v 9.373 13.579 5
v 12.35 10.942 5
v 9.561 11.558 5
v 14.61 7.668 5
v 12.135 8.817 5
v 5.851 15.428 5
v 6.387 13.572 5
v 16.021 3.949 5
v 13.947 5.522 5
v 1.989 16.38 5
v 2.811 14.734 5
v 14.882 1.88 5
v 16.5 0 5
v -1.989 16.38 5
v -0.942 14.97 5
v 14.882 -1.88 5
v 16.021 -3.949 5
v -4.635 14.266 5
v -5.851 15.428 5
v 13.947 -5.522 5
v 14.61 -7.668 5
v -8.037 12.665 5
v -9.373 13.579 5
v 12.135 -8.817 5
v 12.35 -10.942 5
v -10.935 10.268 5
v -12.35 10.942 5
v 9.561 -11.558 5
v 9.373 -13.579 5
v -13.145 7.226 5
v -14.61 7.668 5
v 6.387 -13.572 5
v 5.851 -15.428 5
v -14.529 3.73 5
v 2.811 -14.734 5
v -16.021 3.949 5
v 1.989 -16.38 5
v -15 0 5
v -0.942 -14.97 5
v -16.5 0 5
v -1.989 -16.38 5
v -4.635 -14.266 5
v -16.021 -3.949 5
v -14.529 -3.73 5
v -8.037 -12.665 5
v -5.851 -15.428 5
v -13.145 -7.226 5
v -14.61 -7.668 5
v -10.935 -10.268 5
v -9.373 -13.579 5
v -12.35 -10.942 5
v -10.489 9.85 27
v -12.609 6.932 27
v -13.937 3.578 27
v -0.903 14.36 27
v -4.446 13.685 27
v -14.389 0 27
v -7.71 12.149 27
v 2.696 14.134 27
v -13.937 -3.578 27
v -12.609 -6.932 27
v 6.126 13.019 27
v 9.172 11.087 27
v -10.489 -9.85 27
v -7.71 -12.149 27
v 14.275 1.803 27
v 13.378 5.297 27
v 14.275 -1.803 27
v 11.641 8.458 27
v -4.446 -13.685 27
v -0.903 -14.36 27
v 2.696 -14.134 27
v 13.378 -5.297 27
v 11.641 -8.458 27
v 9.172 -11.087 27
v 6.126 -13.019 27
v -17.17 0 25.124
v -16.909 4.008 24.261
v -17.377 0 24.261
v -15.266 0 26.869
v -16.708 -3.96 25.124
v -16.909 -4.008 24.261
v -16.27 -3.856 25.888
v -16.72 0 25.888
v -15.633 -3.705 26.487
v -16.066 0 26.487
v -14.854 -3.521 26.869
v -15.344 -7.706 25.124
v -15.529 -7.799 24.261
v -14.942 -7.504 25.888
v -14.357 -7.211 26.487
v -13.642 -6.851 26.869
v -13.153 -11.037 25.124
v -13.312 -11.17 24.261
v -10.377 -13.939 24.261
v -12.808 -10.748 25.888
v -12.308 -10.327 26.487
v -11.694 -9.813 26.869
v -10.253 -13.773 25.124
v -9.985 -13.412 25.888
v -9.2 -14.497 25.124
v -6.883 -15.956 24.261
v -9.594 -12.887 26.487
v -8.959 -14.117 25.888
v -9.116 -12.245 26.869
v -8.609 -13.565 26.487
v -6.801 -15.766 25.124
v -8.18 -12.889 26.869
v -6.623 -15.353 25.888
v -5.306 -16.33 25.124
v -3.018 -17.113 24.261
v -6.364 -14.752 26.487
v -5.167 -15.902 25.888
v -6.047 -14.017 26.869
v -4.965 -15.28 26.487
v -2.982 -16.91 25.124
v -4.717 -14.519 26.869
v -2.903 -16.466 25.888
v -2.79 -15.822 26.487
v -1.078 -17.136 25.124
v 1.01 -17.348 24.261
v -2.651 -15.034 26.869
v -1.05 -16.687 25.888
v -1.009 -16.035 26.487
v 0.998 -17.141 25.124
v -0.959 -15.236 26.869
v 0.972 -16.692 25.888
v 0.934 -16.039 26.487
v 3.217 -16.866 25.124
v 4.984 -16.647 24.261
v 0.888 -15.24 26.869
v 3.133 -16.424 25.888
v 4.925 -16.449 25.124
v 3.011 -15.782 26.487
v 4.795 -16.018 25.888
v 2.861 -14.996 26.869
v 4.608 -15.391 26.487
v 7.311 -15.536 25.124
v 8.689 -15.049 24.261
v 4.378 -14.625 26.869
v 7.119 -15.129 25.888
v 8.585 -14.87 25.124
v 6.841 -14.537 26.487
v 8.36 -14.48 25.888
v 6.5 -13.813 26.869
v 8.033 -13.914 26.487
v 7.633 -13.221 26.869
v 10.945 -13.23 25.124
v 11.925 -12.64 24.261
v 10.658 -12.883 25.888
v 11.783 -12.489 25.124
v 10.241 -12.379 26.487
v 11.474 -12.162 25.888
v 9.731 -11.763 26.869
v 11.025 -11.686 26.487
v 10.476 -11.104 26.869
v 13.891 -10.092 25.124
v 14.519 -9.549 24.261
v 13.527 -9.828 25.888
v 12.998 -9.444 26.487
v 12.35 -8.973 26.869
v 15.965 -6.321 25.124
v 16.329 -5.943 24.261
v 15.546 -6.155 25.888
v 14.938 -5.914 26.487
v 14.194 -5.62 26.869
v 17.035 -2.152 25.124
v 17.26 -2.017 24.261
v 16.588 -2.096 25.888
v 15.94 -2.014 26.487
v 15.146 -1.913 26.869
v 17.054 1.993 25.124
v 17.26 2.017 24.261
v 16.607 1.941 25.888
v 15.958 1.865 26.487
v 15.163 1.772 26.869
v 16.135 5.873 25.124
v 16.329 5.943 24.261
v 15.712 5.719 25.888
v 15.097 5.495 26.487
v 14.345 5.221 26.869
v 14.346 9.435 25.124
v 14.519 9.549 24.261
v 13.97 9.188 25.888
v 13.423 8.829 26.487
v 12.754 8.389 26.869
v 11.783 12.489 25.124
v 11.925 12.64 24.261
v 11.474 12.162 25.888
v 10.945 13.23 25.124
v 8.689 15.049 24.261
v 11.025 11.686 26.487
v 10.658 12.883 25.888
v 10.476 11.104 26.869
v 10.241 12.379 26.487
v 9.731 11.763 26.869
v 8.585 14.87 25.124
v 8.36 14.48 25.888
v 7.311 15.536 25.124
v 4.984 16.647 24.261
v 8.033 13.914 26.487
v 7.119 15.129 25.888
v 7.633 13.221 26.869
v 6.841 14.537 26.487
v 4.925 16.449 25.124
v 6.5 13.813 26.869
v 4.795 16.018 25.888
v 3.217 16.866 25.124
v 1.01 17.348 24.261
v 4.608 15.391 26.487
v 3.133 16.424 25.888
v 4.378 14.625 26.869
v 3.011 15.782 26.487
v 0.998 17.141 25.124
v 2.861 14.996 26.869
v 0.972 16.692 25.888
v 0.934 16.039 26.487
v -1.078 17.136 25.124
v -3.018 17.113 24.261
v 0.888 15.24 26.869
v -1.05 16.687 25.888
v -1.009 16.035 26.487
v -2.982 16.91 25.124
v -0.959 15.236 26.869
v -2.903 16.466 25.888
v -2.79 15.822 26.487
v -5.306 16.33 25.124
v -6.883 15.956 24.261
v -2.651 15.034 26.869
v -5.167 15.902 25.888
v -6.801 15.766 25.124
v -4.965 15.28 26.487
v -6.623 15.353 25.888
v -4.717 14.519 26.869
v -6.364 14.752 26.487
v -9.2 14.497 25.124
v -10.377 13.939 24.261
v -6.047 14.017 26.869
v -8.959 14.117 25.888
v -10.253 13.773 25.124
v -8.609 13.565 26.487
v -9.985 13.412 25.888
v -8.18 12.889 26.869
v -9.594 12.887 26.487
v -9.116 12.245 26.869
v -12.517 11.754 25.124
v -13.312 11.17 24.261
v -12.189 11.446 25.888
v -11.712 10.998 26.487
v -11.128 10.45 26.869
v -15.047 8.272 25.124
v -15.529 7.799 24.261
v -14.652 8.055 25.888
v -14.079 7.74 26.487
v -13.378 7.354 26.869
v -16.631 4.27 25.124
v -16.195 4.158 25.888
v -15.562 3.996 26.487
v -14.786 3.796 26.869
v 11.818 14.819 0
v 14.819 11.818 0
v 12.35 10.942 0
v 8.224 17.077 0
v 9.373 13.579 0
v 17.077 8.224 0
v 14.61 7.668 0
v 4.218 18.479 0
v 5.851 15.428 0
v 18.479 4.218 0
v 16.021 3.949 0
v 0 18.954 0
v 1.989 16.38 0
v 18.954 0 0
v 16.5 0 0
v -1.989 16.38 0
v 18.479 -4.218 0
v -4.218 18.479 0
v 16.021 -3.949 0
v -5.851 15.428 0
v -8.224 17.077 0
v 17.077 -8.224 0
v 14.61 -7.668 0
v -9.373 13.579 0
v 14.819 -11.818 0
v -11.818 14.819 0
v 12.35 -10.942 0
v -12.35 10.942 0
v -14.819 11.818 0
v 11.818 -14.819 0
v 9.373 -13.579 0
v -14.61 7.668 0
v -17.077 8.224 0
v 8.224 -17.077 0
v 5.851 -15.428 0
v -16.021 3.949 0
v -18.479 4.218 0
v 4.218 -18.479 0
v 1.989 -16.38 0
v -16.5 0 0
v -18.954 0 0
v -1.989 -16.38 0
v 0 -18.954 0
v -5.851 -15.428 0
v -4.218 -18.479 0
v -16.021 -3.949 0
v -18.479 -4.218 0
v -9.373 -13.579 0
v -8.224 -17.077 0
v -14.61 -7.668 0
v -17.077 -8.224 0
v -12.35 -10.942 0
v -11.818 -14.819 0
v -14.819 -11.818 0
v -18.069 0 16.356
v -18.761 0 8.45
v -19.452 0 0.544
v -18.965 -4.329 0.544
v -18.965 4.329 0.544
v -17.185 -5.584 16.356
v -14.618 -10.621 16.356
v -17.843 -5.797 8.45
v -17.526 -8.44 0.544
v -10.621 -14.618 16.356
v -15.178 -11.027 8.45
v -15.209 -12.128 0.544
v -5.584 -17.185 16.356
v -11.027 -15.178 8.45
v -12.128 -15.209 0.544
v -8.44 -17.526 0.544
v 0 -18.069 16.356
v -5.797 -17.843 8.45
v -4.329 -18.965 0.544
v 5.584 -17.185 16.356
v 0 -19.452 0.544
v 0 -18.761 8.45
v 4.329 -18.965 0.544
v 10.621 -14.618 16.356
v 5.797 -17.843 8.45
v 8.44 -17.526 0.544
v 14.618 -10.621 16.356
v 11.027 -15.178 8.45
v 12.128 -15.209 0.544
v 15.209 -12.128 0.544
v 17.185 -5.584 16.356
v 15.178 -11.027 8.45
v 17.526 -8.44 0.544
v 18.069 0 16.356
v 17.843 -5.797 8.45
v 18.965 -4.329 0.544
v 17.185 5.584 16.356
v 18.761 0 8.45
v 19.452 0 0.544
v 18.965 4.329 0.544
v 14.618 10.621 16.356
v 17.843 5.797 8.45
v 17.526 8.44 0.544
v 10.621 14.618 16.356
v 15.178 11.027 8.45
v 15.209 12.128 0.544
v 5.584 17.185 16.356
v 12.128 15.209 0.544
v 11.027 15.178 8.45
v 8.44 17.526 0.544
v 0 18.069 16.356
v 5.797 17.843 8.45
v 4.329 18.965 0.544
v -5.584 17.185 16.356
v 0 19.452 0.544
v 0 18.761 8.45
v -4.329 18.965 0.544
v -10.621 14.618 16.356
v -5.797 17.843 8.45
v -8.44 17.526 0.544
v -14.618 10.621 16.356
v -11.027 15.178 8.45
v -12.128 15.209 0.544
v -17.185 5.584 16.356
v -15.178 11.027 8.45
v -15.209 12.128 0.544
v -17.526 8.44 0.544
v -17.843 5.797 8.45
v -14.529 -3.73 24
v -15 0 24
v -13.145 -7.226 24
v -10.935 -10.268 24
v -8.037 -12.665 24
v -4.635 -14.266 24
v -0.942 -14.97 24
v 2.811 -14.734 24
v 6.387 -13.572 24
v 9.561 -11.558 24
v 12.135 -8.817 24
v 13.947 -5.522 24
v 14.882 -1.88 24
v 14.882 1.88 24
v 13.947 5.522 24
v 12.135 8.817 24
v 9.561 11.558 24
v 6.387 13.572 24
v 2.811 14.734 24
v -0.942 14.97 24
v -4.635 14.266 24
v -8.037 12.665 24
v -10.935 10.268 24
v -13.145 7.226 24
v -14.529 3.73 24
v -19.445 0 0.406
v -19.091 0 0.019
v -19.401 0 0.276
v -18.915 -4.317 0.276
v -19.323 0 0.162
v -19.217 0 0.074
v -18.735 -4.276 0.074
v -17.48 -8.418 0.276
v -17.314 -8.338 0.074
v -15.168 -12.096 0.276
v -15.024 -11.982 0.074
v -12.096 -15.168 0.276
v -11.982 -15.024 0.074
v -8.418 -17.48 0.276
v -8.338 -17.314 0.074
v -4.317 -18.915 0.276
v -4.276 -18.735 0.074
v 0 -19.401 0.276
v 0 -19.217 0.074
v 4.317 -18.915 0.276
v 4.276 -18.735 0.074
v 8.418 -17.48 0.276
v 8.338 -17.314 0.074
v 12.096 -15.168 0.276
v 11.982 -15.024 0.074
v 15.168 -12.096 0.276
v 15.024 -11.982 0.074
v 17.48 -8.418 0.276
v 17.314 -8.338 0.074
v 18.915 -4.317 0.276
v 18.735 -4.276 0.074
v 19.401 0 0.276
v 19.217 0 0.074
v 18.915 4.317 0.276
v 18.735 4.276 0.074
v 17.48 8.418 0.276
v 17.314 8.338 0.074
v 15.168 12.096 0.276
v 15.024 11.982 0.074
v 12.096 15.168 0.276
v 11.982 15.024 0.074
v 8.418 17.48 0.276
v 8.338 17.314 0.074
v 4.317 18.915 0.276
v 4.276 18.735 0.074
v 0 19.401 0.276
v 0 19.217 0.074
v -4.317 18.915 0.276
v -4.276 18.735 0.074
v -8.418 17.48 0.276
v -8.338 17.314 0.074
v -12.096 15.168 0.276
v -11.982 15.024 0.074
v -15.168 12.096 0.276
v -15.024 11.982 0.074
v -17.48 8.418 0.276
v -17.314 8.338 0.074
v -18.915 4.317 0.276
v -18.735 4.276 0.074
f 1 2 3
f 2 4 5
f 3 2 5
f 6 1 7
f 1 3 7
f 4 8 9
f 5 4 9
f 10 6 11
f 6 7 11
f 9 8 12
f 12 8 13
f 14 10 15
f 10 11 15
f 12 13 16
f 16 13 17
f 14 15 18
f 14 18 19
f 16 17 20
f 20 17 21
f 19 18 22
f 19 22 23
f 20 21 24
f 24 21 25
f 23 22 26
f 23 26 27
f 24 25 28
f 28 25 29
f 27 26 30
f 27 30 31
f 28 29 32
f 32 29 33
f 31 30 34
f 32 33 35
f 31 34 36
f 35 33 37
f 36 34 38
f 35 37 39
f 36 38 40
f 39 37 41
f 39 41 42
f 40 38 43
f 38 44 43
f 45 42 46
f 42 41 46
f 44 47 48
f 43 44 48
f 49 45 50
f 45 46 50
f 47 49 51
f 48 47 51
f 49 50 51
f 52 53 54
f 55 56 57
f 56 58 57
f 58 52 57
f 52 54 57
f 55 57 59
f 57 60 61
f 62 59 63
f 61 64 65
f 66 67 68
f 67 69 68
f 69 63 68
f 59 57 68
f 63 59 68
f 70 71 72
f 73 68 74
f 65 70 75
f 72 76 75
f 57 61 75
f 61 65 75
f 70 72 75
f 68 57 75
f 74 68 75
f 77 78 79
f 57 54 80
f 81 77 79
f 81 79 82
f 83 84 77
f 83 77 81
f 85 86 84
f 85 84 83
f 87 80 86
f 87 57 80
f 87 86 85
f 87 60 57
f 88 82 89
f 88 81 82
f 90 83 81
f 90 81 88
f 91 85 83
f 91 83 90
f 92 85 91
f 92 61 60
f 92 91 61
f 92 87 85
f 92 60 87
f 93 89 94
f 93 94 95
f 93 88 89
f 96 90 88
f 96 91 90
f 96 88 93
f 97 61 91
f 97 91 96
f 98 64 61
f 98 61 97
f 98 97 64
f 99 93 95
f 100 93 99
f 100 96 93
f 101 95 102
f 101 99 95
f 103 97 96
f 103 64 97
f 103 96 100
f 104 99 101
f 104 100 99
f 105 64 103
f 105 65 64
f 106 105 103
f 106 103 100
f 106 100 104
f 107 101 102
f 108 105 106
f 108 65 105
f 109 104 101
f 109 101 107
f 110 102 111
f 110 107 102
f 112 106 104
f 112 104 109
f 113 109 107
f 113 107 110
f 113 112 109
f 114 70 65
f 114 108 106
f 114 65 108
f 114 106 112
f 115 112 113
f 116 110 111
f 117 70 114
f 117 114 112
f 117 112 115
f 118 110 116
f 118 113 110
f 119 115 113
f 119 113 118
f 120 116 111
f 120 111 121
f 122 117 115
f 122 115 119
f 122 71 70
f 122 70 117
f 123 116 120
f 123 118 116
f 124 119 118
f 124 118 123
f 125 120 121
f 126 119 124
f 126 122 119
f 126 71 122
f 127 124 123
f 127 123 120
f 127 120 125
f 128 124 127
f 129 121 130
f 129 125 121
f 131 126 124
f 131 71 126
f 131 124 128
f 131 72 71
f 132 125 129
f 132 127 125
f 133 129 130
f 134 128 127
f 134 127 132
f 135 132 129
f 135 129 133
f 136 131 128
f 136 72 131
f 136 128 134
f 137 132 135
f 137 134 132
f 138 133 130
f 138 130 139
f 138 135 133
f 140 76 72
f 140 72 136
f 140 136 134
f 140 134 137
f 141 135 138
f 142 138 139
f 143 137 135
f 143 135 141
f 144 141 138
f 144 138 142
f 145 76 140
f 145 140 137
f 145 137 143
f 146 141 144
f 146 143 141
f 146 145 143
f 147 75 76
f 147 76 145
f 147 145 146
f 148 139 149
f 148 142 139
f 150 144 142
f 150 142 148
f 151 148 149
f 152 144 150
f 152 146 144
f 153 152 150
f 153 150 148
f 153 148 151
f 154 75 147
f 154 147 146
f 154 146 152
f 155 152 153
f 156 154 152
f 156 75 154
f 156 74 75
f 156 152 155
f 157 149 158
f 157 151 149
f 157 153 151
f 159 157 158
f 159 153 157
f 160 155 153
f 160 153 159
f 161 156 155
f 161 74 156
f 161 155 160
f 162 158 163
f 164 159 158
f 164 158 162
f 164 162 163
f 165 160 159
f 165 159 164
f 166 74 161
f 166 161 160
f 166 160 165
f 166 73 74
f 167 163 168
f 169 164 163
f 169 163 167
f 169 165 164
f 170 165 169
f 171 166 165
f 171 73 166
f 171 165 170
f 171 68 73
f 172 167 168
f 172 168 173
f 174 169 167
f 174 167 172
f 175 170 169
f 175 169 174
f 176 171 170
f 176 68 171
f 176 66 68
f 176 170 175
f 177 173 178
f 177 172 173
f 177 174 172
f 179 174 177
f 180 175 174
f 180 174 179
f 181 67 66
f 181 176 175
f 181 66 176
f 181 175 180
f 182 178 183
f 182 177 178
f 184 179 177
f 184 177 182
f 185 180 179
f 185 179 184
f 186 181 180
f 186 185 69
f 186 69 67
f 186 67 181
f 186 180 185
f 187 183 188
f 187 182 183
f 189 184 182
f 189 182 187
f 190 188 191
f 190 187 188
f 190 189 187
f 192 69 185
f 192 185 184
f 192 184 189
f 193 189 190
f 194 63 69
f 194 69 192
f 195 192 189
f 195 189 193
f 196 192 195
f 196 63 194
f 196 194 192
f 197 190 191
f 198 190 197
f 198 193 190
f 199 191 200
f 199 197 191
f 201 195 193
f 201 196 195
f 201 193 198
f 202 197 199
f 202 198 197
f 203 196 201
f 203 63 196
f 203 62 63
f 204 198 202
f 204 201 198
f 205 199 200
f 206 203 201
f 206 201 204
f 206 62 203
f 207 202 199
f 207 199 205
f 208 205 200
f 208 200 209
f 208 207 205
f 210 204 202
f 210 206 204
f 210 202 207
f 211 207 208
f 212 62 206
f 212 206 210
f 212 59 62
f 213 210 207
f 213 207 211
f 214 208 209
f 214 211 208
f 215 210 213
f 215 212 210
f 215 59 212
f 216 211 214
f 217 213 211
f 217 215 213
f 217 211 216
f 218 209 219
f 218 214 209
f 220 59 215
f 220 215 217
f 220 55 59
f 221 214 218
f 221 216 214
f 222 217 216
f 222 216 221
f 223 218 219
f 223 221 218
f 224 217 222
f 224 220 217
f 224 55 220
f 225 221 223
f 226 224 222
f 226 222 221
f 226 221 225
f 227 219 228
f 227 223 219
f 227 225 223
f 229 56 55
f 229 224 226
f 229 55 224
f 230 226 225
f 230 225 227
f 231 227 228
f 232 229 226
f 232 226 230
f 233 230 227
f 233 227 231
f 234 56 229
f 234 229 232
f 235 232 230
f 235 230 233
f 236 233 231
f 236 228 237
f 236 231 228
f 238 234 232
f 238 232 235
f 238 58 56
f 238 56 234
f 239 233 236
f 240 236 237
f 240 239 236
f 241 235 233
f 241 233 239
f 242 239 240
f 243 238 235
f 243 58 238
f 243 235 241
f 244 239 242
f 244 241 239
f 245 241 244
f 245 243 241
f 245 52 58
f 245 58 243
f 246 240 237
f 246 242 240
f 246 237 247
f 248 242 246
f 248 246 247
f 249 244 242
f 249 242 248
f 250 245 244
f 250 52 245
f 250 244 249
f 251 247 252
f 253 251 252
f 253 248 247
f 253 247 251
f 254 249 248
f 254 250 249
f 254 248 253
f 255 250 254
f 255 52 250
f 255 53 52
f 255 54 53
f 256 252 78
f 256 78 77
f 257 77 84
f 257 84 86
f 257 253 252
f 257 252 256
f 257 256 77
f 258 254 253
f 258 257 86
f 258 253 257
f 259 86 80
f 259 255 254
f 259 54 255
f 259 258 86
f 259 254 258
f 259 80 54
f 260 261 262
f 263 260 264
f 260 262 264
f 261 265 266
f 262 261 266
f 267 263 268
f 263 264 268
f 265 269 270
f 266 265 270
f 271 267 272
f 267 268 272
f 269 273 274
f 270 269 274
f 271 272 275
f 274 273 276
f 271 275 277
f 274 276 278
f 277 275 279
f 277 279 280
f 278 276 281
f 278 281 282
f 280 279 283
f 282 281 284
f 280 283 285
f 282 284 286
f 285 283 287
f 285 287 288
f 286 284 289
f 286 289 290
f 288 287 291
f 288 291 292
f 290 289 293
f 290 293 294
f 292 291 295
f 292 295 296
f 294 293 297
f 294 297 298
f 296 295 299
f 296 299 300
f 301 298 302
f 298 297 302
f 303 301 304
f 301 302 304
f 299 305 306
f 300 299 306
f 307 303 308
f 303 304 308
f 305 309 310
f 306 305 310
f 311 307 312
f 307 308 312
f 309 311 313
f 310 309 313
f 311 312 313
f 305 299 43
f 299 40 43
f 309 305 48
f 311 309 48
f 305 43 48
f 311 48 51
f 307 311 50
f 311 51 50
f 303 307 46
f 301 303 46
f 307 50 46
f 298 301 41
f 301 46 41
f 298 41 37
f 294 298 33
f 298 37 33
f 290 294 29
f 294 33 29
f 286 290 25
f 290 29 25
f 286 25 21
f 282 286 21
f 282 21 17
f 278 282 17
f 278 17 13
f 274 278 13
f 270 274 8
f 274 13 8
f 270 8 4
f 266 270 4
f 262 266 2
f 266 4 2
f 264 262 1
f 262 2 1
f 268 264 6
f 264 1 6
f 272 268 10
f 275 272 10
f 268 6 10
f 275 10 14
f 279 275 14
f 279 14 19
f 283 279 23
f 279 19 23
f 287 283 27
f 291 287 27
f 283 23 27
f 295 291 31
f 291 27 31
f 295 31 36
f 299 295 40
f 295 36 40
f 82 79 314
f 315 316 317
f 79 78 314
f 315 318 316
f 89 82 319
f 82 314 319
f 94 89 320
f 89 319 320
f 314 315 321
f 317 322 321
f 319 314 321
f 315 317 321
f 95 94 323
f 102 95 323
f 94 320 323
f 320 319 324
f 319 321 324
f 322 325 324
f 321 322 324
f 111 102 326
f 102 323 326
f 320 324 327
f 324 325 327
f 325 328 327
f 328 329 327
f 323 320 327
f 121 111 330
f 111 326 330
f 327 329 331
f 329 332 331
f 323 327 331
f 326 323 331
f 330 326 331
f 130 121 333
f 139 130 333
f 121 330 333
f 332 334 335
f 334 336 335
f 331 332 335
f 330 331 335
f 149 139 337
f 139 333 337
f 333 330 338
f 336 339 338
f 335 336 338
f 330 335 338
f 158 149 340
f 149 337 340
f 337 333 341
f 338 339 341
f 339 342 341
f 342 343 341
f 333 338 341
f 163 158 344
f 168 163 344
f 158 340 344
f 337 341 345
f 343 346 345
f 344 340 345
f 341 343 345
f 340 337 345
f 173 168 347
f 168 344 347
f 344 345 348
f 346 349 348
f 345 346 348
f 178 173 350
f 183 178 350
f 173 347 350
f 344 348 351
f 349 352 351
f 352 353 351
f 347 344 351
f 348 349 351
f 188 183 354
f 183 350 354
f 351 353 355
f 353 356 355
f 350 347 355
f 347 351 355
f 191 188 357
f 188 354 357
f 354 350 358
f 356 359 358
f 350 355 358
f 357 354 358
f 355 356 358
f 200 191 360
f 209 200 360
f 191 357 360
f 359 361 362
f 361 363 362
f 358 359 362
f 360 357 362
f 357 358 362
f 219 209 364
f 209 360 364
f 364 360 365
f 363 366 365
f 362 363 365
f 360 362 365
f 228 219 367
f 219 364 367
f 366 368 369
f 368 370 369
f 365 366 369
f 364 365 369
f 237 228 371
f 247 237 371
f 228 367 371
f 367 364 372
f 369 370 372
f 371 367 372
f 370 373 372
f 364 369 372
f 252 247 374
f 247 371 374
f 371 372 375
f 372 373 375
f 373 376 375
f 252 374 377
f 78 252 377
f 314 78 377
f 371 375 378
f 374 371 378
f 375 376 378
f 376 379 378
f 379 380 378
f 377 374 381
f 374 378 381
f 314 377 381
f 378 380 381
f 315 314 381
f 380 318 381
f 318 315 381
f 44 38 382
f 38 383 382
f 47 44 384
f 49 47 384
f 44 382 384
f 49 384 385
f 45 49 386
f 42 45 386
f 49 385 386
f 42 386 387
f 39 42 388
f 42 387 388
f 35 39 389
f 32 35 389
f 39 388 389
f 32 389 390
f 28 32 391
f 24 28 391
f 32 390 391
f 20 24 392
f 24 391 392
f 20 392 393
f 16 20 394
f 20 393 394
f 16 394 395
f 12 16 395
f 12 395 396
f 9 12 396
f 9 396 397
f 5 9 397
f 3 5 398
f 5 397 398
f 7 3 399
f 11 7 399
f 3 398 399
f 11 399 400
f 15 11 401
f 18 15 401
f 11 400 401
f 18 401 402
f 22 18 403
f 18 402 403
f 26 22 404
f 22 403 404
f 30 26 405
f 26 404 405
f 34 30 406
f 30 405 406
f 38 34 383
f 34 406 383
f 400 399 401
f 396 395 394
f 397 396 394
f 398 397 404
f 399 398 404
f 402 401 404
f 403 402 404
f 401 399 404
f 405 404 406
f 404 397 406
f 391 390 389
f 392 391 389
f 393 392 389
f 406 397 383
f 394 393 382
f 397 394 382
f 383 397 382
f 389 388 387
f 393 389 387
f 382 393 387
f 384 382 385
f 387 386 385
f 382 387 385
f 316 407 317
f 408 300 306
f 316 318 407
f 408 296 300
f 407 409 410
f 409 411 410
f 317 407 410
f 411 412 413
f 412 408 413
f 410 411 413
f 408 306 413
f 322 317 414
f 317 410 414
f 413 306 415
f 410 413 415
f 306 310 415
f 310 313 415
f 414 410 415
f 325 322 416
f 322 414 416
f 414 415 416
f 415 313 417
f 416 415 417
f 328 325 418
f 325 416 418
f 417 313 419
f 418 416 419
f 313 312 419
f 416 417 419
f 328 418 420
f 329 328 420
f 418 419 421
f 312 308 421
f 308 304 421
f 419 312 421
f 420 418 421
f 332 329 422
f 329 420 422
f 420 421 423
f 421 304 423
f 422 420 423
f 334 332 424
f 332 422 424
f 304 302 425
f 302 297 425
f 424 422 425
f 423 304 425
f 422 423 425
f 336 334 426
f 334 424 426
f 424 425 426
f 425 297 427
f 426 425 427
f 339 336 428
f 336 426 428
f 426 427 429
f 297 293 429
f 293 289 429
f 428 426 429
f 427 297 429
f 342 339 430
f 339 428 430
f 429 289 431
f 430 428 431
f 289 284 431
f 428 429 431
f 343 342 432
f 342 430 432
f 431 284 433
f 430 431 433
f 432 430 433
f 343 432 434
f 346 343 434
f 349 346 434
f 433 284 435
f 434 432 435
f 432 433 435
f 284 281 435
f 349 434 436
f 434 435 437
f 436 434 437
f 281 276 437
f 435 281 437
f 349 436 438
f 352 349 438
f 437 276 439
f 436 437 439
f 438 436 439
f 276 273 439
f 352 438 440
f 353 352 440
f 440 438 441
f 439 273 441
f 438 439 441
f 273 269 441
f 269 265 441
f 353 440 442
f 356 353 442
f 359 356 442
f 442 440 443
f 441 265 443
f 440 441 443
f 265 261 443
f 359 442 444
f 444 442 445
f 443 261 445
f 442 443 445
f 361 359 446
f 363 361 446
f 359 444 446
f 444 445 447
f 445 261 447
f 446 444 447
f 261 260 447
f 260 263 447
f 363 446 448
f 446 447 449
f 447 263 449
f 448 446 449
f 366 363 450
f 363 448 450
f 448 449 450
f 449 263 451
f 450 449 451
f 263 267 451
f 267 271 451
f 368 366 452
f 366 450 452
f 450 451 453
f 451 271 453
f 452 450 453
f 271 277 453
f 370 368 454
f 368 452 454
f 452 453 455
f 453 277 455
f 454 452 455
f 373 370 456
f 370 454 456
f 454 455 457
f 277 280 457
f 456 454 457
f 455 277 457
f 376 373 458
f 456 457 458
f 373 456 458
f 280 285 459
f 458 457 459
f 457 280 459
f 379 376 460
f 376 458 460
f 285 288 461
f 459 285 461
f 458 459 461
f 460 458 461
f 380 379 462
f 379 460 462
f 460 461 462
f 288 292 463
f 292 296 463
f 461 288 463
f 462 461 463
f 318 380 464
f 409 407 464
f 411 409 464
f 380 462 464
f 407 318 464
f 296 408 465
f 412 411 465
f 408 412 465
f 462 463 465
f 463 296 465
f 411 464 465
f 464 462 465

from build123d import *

# Parameters (mm, degrees)
F2_R = 3
F3_R = 0.5


with BuildPart() as f1:
    # F0 (on Front) → F1 (revolve)
    with BuildSketch(Plane.XZ):
        Polygon((-17.137806, 27), (-19.5, 0), (-16.5, 0), (-16.5, 5), (-15, 5), (-15, 24), (0, 24), (0, 27), align=None)
    revolve(axis=Axis((0, 0, 19.736372), (0, 0, 1)))

    # F2
    f2_edges = [f1.edges().sort_by_distance(p)[0] for p in [
        (17.137806, 0, 27),
    ]]
    fillet(f2_edges, radius=F2_R)

    # F3
    f3_edges = [f1.edges().sort_by_distance(p)[0] for p in [
        (19.5, 0, 0),
    ]]
    fillet(f3_edges, radius=F3_R)


solid = f1.part
